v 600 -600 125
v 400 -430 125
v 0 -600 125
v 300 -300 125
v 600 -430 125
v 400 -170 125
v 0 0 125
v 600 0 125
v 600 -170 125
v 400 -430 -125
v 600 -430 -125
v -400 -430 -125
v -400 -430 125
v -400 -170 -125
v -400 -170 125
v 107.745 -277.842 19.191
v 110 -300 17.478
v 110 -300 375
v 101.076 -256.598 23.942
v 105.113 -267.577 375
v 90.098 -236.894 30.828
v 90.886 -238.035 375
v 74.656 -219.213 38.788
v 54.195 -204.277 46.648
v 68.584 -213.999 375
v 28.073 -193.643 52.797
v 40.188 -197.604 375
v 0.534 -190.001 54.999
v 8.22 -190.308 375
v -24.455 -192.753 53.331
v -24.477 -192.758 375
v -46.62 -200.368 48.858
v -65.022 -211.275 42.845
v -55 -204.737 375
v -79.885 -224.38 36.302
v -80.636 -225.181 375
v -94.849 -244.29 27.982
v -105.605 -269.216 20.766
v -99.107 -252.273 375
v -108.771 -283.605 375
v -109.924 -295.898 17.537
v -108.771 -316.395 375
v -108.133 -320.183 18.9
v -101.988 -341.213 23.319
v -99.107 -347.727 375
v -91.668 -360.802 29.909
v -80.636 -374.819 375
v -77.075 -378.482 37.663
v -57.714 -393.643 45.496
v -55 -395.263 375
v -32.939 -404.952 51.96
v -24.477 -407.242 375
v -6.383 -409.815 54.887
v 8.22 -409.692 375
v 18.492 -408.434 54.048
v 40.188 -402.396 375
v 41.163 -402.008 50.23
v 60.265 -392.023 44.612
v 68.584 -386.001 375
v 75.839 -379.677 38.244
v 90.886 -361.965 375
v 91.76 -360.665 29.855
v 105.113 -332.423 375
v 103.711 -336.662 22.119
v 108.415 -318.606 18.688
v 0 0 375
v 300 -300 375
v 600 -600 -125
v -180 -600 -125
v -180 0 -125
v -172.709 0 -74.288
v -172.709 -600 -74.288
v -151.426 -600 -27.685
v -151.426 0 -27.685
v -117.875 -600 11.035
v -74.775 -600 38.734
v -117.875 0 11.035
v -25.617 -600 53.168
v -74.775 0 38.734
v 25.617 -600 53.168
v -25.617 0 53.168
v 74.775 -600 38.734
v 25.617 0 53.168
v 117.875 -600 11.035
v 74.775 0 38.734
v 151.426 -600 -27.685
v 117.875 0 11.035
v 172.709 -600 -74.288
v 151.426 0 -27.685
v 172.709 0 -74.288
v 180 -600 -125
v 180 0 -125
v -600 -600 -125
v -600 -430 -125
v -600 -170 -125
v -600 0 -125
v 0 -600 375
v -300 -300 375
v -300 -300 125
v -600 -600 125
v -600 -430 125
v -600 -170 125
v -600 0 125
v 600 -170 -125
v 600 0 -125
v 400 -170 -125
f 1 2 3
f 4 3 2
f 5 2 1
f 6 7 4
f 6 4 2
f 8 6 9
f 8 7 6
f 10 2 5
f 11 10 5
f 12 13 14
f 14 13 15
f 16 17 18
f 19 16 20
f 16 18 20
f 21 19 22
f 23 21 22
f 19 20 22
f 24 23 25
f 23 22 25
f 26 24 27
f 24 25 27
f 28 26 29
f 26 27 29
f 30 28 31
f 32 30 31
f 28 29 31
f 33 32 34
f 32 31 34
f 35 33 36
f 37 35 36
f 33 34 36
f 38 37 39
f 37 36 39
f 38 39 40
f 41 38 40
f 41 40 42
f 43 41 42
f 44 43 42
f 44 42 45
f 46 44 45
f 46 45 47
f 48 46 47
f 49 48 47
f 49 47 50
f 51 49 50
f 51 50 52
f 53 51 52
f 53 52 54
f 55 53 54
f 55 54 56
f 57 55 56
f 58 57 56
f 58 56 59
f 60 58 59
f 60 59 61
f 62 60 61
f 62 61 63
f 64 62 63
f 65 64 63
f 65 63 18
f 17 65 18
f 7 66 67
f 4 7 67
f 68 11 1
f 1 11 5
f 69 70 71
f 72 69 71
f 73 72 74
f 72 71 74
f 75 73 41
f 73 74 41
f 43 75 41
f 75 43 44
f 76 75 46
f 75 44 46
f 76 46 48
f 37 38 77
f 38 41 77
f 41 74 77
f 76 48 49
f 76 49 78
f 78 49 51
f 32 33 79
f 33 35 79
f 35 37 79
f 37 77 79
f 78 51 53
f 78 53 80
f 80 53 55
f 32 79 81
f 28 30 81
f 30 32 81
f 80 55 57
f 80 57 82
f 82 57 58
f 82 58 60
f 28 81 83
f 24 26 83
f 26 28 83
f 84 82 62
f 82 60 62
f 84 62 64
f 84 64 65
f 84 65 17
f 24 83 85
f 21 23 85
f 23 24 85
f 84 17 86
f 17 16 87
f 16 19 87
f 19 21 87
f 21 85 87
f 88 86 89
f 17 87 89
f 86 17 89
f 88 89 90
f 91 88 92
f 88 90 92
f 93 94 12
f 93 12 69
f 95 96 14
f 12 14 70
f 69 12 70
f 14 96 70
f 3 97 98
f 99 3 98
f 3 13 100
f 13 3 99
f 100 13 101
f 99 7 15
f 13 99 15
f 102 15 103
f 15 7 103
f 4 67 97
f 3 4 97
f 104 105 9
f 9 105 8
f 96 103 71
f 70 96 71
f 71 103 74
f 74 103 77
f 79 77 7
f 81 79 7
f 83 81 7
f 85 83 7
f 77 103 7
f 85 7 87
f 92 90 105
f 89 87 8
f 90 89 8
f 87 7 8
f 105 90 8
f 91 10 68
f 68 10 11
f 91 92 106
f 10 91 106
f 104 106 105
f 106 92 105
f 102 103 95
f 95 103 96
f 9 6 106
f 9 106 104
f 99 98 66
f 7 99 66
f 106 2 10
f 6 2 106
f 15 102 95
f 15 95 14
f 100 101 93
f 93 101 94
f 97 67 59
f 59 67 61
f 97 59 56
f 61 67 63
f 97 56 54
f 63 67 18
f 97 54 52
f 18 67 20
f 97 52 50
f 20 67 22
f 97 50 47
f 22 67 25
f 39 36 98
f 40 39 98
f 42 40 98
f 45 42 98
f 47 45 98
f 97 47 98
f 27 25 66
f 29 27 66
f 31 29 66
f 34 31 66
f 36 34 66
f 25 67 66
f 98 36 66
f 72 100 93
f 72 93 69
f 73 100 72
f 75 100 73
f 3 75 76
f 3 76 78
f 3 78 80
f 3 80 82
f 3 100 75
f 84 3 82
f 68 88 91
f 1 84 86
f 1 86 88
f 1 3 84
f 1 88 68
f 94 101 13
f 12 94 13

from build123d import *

# Parameters (mm, degrees)
F1_DEPTH  = 600
F2_W      = 400
F2_H      = 260
F3_DEPTH  = 250.001
F5_DEPTH  = 250.001
F4_W      = 400
F4_H      = 260
F6_DEPTH  = 250.001
F8_DEPTH  = 250
F10_DEPTH = 250
F12_DEPTH = 250
F14_DEPTH = 250
F15_R     = 110
F16_DEPTH = 500.001


with BuildPart() as f1:
    # F0 (on Front) → F1 (new body)
    with BuildSketch(Plane.XZ):
        with BuildLine():
            Line((-600, 125), (-600, -125))
            Line((-600, -125), (-180, -125))
            ThreePointArc((-180, -125), (0, 55), (180, -125))
            Line((180, -125), (600, -125))
            Line((600, -125), (600, 125))
            Line((600, 125), (300, 125))
            Line((300, 125), (300, 375))
            Line((300, 375), (-300, 375))
            Line((-300, 375), (-300, 125))
            Line((-300, 125), (-600, 125))
        make_face()
    extrude(amount=F1_DEPTH)

    # F2 (on face) → F3 (cut, through all)
    with BuildSketch(Plane.XY.offset(125)):
        with Locations((600, -300)):
            Rectangle(F2_W, F2_H)
    extrude(amount=-F3_DEPTH, mode=Mode.SUBTRACT)

    # F2 (on face) → F5 (cut, through all)
    with BuildSketch(Plane.XY.offset(125)):
        with Locations((600, -300)):
            Rectangle(F2_W, F2_H)
    extrude(amount=-F5_DEPTH, mode=Mode.SUBTRACT)

    # F4 (on face) → F6 (cut, through all)
    with BuildSketch(Plane.XY.offset(125)):
        with Locations((-600, -300)):
            Rectangle(F4_W, F4_H)
    extrude(amount=-F6_DEPTH, mode=Mode.SUBTRACT)

    # F7 (on face) → F8 (cut)
    with BuildSketch(Plane.XY.offset(375)):
        Polygon((300, -300), (0, -600), (300, -600), align=None)
    extrude(amount=-F8_DEPTH, mode=Mode.SUBTRACT)

    # F9 (on face) → F10 (cut)
    with BuildSketch(Plane.XY.offset(375)):
        Polygon((-300, -600), (0, -600), (-300, -300), align=None)
    extrude(amount=-F10_DEPTH, mode=Mode.SUBTRACT)

    # F11 (on face) → F12 (cut)
    with BuildSketch(Plane.XY.offset(375)):
        Polygon((300, -300), (300, 0), (0, 0), align=None)
    extrude(amount=-F12_DEPTH, mode=Mode.SUBTRACT)

    # F13 (on face) → F14 (cut)
    with BuildSketch(Plane.XY.offset(375)):
        Polygon((0, 0), (-300, 0), (-300, -300), align=None)
    extrude(amount=-F14_DEPTH, mode=Mode.SUBTRACT)

    # F15 (on face) → F16 (cut, through all)
    with BuildSketch(Plane.XY.offset(375)):
        with Locations((0, -300)):
            Circle(F15_R)
    extrude(amount=-F16_DEPTH, mode=Mode.SUBTRACT)


solid = f1.part
